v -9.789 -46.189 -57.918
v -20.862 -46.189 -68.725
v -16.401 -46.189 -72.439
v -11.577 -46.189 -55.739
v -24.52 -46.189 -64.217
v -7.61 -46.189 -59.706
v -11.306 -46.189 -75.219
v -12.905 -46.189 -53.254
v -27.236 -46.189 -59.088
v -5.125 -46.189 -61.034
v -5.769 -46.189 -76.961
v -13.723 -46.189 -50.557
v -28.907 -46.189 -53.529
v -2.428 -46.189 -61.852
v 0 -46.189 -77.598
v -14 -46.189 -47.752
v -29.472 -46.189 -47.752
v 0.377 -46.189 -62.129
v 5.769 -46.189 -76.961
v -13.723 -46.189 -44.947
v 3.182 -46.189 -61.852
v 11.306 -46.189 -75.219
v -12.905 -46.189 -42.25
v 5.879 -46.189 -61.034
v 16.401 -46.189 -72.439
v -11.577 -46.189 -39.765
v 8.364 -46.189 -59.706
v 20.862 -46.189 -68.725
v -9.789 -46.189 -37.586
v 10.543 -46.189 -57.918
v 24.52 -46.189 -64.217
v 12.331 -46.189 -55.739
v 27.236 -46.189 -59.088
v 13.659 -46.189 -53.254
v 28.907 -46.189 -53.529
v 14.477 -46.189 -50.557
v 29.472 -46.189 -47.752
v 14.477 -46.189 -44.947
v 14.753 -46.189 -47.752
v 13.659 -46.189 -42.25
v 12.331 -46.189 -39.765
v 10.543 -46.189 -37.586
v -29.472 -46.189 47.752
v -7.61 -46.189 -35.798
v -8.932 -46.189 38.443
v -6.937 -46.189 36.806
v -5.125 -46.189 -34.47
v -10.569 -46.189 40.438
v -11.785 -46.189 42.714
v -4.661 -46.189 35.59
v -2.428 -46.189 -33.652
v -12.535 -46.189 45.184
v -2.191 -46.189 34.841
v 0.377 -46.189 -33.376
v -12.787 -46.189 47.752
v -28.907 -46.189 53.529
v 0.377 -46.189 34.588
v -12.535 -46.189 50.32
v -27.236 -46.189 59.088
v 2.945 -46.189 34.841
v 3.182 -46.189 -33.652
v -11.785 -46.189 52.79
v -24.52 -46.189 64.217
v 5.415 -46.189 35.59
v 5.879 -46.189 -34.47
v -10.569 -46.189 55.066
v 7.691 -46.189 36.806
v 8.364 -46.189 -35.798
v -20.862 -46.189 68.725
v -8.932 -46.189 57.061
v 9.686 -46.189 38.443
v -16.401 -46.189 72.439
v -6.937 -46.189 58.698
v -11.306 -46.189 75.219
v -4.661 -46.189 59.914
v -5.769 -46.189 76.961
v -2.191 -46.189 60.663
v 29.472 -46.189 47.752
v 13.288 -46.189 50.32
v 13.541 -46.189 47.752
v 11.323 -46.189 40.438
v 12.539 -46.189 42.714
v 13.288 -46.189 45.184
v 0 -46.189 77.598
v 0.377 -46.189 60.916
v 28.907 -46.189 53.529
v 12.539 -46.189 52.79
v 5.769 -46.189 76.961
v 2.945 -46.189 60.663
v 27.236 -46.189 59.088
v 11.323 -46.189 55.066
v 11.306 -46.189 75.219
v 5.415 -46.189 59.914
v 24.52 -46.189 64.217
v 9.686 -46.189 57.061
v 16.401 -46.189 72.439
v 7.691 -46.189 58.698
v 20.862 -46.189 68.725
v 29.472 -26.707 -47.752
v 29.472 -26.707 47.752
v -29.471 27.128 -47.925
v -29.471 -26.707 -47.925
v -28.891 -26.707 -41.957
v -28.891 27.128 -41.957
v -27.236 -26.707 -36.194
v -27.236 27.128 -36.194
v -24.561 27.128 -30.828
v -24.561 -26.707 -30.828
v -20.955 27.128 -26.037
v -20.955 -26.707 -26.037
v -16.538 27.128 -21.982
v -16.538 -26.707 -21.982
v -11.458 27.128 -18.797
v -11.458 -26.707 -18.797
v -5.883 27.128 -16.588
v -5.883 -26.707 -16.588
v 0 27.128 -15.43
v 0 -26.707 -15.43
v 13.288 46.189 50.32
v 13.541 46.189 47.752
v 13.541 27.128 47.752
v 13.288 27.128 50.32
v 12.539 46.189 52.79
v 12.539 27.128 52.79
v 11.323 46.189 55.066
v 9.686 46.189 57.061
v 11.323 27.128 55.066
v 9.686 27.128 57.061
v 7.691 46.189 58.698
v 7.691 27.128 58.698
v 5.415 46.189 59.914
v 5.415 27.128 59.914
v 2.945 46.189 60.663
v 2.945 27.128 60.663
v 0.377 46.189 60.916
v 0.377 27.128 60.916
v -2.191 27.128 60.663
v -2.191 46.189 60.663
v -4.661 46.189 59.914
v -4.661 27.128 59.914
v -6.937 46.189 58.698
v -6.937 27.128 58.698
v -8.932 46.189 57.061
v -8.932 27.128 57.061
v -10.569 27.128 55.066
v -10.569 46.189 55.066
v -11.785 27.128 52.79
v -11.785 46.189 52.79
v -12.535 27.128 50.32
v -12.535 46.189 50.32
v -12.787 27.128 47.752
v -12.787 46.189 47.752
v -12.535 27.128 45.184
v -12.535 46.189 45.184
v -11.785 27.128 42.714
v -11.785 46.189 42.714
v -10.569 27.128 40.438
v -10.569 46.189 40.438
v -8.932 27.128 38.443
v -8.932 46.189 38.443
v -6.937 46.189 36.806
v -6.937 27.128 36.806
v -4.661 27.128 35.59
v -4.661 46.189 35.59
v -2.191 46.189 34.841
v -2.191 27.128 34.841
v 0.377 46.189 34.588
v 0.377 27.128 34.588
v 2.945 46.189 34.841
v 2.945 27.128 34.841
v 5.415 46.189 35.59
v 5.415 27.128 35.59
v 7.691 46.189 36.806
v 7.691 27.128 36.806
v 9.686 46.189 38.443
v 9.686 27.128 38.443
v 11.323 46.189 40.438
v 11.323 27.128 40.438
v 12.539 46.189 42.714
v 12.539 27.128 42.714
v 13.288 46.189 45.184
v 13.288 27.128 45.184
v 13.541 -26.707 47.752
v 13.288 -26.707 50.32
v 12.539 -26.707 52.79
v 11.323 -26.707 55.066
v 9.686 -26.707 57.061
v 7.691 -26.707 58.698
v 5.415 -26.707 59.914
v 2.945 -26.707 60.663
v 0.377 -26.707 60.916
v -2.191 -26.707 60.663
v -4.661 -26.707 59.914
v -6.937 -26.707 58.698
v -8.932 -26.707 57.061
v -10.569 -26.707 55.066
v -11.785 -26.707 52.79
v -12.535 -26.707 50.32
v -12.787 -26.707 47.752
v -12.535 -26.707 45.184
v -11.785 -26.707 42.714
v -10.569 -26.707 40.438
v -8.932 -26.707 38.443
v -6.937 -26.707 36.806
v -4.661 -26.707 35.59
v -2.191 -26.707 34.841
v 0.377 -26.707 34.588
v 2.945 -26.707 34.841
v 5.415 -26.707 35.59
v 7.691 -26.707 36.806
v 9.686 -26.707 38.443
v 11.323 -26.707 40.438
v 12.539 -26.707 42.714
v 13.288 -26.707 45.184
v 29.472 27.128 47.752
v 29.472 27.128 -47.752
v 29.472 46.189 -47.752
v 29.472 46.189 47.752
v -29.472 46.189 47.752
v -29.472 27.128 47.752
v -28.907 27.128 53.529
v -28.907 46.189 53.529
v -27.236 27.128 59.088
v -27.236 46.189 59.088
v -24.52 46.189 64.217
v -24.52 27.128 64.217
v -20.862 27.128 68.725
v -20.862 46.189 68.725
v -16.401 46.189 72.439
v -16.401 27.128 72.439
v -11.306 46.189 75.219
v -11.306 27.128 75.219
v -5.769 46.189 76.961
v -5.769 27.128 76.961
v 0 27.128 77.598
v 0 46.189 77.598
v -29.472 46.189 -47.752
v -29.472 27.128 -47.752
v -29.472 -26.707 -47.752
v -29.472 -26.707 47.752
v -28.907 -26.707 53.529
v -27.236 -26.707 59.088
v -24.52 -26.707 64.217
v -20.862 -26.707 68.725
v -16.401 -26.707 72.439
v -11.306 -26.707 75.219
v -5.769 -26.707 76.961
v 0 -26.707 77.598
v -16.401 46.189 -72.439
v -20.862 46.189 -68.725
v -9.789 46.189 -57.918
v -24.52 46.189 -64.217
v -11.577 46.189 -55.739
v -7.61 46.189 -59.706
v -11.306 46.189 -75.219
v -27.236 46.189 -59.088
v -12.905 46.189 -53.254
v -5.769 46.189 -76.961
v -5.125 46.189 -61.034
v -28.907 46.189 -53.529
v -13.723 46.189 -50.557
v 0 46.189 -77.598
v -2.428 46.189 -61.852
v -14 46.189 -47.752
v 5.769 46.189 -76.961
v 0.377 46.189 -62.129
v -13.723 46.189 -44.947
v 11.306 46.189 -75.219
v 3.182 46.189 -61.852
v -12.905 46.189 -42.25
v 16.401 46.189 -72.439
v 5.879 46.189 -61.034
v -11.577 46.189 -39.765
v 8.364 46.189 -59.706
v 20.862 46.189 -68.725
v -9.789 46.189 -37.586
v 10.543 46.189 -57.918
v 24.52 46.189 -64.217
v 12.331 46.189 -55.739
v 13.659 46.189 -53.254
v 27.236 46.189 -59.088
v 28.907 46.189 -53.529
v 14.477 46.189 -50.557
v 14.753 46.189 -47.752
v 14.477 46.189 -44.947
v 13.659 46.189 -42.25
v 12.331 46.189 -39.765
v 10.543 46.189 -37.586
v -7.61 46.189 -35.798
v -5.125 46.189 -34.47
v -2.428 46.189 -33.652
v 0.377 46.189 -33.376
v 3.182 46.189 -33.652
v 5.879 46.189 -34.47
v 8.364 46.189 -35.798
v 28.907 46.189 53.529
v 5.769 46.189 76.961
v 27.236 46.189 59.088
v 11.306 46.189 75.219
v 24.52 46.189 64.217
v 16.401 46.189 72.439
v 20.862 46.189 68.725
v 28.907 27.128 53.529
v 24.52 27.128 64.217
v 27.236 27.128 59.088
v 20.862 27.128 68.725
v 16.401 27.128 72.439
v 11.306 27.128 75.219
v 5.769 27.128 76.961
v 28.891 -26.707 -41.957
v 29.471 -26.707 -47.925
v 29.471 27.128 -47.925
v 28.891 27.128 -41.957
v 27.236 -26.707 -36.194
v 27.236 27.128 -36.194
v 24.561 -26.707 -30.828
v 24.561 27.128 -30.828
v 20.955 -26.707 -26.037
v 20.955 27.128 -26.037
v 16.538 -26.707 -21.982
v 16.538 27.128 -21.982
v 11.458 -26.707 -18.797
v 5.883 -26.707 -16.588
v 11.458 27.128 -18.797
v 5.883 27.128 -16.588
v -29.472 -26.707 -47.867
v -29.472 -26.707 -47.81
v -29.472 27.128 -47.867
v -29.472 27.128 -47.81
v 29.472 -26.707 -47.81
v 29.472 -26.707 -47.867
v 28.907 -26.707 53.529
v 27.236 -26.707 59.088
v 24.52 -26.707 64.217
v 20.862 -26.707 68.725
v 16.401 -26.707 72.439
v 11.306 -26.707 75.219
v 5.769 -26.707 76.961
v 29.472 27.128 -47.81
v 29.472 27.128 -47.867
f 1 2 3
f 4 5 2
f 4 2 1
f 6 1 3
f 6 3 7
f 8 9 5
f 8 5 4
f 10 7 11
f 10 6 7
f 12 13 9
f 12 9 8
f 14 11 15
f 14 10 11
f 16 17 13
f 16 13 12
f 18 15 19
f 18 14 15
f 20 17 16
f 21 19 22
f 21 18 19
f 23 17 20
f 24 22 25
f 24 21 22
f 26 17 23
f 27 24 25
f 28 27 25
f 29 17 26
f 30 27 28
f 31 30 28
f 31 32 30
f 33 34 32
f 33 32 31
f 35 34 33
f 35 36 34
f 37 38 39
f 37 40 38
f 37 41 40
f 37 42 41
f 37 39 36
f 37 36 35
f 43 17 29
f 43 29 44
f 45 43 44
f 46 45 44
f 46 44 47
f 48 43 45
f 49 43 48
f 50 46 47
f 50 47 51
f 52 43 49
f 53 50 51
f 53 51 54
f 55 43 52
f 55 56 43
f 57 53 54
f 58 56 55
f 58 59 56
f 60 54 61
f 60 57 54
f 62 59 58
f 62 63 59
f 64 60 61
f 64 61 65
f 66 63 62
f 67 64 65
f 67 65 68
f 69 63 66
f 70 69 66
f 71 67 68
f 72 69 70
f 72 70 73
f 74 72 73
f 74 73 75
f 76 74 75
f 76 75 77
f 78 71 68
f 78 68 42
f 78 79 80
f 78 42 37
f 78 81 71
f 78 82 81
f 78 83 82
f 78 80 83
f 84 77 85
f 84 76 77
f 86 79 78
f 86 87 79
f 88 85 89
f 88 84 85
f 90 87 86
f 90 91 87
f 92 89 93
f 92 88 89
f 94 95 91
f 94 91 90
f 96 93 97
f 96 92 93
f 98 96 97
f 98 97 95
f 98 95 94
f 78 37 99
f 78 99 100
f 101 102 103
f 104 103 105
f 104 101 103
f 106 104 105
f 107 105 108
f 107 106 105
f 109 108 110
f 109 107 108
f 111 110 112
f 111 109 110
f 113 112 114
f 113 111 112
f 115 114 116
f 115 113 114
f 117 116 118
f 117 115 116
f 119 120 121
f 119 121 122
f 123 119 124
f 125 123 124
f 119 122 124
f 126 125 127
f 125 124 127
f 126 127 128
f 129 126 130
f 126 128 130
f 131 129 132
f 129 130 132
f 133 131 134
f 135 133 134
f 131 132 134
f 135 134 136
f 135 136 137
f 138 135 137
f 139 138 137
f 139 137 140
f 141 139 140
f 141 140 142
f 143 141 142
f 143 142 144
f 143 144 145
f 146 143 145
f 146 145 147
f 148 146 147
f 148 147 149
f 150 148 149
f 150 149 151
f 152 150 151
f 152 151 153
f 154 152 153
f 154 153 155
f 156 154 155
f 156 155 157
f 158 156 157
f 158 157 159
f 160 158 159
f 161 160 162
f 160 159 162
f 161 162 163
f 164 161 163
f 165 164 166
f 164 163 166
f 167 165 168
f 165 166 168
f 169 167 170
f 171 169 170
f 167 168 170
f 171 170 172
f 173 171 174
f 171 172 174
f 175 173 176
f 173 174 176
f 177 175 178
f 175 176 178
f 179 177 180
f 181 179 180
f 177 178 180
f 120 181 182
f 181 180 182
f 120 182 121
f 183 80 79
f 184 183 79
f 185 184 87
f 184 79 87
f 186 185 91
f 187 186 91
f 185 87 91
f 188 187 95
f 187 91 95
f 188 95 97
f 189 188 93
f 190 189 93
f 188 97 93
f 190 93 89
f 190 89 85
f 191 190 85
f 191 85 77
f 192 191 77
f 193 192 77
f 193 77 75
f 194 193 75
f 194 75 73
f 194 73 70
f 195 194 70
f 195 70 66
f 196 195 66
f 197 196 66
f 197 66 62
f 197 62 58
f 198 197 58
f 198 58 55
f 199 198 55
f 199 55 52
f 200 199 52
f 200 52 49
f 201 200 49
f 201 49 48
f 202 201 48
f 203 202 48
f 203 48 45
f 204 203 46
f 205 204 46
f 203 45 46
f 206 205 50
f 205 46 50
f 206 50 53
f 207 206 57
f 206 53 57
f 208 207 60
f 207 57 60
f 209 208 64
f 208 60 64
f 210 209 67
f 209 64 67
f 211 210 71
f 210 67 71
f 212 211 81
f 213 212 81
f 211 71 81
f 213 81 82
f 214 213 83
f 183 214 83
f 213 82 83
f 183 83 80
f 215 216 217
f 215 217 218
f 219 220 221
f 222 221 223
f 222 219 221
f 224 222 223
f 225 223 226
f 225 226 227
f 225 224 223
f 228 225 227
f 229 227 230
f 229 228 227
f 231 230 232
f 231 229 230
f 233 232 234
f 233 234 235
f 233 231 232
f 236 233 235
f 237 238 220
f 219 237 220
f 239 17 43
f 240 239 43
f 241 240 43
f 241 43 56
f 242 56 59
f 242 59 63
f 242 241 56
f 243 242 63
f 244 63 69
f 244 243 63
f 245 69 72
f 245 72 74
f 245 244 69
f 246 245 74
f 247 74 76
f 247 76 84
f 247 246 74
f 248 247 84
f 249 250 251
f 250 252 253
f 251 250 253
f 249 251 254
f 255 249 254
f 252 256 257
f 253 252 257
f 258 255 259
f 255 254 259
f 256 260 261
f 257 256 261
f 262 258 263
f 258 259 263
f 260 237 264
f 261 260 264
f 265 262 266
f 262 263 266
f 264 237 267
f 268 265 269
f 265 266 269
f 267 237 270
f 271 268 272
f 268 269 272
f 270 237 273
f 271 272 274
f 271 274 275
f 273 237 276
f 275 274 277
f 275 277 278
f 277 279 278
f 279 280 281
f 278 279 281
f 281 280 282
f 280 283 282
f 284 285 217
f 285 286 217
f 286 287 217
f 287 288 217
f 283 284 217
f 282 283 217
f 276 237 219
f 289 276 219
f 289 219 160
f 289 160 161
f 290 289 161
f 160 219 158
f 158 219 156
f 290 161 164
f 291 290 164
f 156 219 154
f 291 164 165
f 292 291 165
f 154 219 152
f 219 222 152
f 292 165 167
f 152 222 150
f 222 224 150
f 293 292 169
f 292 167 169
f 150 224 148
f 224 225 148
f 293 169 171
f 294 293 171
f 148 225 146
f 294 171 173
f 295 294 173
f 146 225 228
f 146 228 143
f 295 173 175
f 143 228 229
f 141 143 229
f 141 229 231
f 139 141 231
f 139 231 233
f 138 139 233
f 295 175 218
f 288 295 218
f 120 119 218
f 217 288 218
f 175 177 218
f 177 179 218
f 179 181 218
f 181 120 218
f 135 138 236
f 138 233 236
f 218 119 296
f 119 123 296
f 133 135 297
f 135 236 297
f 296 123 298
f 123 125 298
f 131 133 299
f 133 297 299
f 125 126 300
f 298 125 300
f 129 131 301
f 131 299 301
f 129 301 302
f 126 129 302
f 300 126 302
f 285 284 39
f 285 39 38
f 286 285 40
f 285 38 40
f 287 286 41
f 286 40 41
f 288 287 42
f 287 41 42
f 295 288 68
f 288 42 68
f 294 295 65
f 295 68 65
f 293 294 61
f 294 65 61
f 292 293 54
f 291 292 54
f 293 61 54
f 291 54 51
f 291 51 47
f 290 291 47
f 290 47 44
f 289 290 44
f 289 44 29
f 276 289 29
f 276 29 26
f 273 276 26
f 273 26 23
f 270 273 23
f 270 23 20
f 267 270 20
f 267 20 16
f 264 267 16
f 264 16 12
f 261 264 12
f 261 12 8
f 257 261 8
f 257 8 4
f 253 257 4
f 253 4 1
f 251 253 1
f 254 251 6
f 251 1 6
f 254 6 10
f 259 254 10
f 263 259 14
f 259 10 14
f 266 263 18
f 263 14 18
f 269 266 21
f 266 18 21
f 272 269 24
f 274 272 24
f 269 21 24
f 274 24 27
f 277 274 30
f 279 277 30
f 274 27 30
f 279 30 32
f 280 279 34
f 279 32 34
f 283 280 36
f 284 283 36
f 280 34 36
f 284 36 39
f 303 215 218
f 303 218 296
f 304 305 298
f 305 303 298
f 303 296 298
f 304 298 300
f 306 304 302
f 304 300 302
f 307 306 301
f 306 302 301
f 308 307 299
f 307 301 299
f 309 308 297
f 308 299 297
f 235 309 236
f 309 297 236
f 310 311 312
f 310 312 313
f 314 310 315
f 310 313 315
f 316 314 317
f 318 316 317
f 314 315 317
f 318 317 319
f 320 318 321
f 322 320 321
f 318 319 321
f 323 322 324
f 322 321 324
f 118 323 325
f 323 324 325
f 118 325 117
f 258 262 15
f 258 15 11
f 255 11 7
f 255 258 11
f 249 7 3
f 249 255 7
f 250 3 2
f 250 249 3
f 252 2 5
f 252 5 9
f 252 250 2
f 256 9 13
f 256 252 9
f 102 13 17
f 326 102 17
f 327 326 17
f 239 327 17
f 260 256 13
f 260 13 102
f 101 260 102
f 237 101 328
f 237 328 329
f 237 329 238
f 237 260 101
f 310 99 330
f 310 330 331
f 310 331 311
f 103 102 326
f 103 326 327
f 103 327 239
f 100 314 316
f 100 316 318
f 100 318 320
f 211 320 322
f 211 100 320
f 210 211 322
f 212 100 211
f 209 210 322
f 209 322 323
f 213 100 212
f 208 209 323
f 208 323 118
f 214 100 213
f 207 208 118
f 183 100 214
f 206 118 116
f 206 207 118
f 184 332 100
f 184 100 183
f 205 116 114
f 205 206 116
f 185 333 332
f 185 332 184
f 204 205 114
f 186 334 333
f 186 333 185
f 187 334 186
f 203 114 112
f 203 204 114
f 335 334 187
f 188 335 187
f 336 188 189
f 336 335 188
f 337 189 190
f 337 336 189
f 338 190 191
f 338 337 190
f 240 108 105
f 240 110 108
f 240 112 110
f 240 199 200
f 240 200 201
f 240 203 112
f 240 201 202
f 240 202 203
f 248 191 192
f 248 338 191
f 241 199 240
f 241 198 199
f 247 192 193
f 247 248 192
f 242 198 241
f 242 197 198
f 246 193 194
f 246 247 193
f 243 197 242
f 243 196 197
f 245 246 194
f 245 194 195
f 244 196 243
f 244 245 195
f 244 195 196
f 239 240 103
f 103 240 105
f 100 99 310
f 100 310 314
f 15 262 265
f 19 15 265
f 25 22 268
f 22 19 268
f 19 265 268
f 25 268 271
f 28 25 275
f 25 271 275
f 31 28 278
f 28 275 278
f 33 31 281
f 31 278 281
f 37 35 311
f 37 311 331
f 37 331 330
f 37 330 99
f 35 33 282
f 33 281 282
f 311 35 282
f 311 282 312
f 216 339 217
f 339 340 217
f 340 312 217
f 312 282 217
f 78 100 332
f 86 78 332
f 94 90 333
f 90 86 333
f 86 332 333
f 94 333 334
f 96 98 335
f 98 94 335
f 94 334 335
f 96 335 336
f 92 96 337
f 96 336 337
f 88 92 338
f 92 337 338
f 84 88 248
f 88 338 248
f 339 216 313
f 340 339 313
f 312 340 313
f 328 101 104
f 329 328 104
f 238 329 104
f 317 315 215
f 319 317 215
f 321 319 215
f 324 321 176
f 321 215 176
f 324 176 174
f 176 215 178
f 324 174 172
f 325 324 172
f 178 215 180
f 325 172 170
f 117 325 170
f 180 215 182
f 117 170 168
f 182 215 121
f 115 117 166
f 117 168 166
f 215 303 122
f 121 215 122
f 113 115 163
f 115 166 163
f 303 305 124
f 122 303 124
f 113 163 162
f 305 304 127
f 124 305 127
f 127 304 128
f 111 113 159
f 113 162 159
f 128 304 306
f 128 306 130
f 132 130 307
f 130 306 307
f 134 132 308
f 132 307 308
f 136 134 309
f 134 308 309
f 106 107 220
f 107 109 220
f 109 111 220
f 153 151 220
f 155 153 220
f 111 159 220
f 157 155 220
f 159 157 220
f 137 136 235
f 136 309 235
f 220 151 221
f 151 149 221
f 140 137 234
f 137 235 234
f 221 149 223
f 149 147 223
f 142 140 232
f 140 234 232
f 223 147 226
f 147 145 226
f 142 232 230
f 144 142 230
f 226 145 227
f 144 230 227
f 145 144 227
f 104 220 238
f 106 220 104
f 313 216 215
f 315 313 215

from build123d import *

# Parameters (mm, degrees)
F0_W        = 58.9435696602
F0_H        = 155.2014648914
F4_DEPTH    = 46.1890073493
F5_W        = 53.8340881467
F5_H        = 92.8563177586
F1_DEPTH    = 58.9445696602
F2_T1_DEPTH = 168.3050352459
F2_T3_DEPTH = 168.726075006
F2_T5_DEPTH = 241.6216065486
F3_T1_DEPTH = 53.8340881467
F6_R        = 13.164421927
F6_R_2      = 14.3764863779
F7_DEPTH    = 92.3790146986


# Not quite as in the source:
# - a fillet or chamfer that OpenCascade refuses, or shapes differently, is made with other operations: its cross-section is extruded or revolved along the edge and cut away or added


with BuildPart() as f4:
    # F0 (on Front) → F4 (new body, symmetric)
    with BuildSketch(Plane.XZ):
        Rectangle(F0_W, F0_H)
    extrude(amount=F4_DEPTH, both=True)

    # F5 (on face) → F1 (cut, through all)
    with BuildSketch(Plane.YZ.offset(29.4717848301)):
        with Locations((0.2105198801, 31.1725735664)):
            Rectangle(F5_W, F5_H)
    extrude(amount=-F1_DEPTH, mode=Mode.SUBTRACT)

    # F2: fillet of radius 29.84871837 on 6 edges, made by hand

    # F2_s2 → F2_t1 (cut)
    with BuildSketch(Plane.XZ.offset(-120.8108032743)):
        with BuildLine():
            ThreePointArc((29.4717848301, 47.7520140757), (20.7292976292, 68.8582452449), (-0.3769335399, 77.6007324457))
            Line((-0.3769335399, 77.6007324457), (29.4717848301, 77.6007324457))
            Line((29.4717848301, 77.6007324457), (29.4717848301, 47.7520140757))
        make_face()
        with BuildLine():
            ThreePointArc((-29.4717848301, 47.7520140757), (-20.7292976292, 68.8582452449), (0.3769335399, 77.6007324457))
            Line((0.3769335399, 77.6007324457), (-29.4717848301, 77.6007324457))
            Line((-29.4717848301, 77.6007324457), (-29.4717848301, 47.7520140757))
        make_face()
    extrude(amount=F2_T1_DEPTH, mode=Mode.SUBTRACT)

    # F2_s4 → F2_t3 (cut)
    with BuildSketch(Plane.XZ.offset(-47.9152717317)):
        with BuildLine():
            ThreePointArc((29.4717848301, 47.7520140757), (20.7292976292, 68.8582452449), (-0.3769335399, 77.6007324457))
            Line((-0.3769335399, 77.6007324457), (29.4717848301, 77.6007324457))
            Line((29.4717848301, 77.6007324457), (29.4717848301, 47.7520140757))
        make_face()
        with BuildLine():
            ThreePointArc((-29.4717848301, 47.7520140757), (-20.7292976292, 68.8582452449), (0.3769335399, 77.6007324457))
            Line((0.3769335399, 77.6007324457), (-29.4717848301, 77.6007324457))
            Line((-29.4717848301, 77.6007324457), (-29.4717848301, 47.7520140757))
        make_face()
    extrude(amount=F2_T3_DEPTH, mode=Mode.SUBTRACT)

    # F2_s6 → F2_t5 (cut)
    with BuildSketch(Plane.XZ.offset(-120.8108032743)):
        with BuildLine():
            ThreePointArc((-0.3769335399, -77.6007324457), (20.7292976292, -68.8582452449), (29.4717848301, -47.7520140757))
            Line((29.4717848301, -47.7520140757), (29.4717848301, -77.6007324457))
            Line((29.4717848301, -77.6007324457), (-0.3769335399, -77.6007324457))
        make_face()
        with BuildLine():
            ThreePointArc((0.3769335399, -77.6007324457), (-20.7292976292, -68.8582452449), (-29.4717848301, -47.7520140757))
            Line((-29.4717848301, -47.7520140757), (-29.4717848301, -77.6007324457))
            Line((-29.4717848301, -77.6007324457), (0.3769335399, -77.6007324457))
        make_face()
    extrude(amount=F2_T5_DEPTH, mode=Mode.SUBTRACT)

    # F3: fillet of radius 32.8509948239 on 2 edges, made by hand

    # F3_s2 → F3_t1 (cut)
    with BuildSketch(Plane.XZ.offset(-27.1275639534)):
        with BuildLine():
            ThreePointArc((29.4717848301, -48.1065801367), (19.8499512149, -24.877418928), (-3.3792099938, -15.2555853128))
            Line((-3.3792099938, -15.2555853128), (29.4717848301, -15.2555853128))
            Line((29.4717848301, -15.2555853128), (29.4717848301, -48.1065801367))
        make_face()
        with BuildLine():
            ThreePointArc((-29.4717848301, -48.1065801367), (-19.8499512149, -24.877418928), (3.3792099938, -15.2555853128))
            Line((3.3792099938, -15.2555853128), (-29.4717848301, -15.2555853128))
            Line((-29.4717848301, -15.2555853128), (-29.4717848301, -48.1065801367))
        make_face()
    extrude(amount=F3_T1_DEPTH, mode=Mode.SUBTRACT)

    # F6 (on face) → F7 (cut, through all)
    with BuildSketch(Plane.XZ.offset(46.1890073493)):
        with Locations((0.3769335399, 47.7520140757)):
            Circle(F6_R)
        with Locations((0.3769335399, -47.7520140757)):
            Circle(F6_R_2)
    extrude(amount=-F7_DEPTH, mode=Mode.SUBTRACT)


solid = f4.part
